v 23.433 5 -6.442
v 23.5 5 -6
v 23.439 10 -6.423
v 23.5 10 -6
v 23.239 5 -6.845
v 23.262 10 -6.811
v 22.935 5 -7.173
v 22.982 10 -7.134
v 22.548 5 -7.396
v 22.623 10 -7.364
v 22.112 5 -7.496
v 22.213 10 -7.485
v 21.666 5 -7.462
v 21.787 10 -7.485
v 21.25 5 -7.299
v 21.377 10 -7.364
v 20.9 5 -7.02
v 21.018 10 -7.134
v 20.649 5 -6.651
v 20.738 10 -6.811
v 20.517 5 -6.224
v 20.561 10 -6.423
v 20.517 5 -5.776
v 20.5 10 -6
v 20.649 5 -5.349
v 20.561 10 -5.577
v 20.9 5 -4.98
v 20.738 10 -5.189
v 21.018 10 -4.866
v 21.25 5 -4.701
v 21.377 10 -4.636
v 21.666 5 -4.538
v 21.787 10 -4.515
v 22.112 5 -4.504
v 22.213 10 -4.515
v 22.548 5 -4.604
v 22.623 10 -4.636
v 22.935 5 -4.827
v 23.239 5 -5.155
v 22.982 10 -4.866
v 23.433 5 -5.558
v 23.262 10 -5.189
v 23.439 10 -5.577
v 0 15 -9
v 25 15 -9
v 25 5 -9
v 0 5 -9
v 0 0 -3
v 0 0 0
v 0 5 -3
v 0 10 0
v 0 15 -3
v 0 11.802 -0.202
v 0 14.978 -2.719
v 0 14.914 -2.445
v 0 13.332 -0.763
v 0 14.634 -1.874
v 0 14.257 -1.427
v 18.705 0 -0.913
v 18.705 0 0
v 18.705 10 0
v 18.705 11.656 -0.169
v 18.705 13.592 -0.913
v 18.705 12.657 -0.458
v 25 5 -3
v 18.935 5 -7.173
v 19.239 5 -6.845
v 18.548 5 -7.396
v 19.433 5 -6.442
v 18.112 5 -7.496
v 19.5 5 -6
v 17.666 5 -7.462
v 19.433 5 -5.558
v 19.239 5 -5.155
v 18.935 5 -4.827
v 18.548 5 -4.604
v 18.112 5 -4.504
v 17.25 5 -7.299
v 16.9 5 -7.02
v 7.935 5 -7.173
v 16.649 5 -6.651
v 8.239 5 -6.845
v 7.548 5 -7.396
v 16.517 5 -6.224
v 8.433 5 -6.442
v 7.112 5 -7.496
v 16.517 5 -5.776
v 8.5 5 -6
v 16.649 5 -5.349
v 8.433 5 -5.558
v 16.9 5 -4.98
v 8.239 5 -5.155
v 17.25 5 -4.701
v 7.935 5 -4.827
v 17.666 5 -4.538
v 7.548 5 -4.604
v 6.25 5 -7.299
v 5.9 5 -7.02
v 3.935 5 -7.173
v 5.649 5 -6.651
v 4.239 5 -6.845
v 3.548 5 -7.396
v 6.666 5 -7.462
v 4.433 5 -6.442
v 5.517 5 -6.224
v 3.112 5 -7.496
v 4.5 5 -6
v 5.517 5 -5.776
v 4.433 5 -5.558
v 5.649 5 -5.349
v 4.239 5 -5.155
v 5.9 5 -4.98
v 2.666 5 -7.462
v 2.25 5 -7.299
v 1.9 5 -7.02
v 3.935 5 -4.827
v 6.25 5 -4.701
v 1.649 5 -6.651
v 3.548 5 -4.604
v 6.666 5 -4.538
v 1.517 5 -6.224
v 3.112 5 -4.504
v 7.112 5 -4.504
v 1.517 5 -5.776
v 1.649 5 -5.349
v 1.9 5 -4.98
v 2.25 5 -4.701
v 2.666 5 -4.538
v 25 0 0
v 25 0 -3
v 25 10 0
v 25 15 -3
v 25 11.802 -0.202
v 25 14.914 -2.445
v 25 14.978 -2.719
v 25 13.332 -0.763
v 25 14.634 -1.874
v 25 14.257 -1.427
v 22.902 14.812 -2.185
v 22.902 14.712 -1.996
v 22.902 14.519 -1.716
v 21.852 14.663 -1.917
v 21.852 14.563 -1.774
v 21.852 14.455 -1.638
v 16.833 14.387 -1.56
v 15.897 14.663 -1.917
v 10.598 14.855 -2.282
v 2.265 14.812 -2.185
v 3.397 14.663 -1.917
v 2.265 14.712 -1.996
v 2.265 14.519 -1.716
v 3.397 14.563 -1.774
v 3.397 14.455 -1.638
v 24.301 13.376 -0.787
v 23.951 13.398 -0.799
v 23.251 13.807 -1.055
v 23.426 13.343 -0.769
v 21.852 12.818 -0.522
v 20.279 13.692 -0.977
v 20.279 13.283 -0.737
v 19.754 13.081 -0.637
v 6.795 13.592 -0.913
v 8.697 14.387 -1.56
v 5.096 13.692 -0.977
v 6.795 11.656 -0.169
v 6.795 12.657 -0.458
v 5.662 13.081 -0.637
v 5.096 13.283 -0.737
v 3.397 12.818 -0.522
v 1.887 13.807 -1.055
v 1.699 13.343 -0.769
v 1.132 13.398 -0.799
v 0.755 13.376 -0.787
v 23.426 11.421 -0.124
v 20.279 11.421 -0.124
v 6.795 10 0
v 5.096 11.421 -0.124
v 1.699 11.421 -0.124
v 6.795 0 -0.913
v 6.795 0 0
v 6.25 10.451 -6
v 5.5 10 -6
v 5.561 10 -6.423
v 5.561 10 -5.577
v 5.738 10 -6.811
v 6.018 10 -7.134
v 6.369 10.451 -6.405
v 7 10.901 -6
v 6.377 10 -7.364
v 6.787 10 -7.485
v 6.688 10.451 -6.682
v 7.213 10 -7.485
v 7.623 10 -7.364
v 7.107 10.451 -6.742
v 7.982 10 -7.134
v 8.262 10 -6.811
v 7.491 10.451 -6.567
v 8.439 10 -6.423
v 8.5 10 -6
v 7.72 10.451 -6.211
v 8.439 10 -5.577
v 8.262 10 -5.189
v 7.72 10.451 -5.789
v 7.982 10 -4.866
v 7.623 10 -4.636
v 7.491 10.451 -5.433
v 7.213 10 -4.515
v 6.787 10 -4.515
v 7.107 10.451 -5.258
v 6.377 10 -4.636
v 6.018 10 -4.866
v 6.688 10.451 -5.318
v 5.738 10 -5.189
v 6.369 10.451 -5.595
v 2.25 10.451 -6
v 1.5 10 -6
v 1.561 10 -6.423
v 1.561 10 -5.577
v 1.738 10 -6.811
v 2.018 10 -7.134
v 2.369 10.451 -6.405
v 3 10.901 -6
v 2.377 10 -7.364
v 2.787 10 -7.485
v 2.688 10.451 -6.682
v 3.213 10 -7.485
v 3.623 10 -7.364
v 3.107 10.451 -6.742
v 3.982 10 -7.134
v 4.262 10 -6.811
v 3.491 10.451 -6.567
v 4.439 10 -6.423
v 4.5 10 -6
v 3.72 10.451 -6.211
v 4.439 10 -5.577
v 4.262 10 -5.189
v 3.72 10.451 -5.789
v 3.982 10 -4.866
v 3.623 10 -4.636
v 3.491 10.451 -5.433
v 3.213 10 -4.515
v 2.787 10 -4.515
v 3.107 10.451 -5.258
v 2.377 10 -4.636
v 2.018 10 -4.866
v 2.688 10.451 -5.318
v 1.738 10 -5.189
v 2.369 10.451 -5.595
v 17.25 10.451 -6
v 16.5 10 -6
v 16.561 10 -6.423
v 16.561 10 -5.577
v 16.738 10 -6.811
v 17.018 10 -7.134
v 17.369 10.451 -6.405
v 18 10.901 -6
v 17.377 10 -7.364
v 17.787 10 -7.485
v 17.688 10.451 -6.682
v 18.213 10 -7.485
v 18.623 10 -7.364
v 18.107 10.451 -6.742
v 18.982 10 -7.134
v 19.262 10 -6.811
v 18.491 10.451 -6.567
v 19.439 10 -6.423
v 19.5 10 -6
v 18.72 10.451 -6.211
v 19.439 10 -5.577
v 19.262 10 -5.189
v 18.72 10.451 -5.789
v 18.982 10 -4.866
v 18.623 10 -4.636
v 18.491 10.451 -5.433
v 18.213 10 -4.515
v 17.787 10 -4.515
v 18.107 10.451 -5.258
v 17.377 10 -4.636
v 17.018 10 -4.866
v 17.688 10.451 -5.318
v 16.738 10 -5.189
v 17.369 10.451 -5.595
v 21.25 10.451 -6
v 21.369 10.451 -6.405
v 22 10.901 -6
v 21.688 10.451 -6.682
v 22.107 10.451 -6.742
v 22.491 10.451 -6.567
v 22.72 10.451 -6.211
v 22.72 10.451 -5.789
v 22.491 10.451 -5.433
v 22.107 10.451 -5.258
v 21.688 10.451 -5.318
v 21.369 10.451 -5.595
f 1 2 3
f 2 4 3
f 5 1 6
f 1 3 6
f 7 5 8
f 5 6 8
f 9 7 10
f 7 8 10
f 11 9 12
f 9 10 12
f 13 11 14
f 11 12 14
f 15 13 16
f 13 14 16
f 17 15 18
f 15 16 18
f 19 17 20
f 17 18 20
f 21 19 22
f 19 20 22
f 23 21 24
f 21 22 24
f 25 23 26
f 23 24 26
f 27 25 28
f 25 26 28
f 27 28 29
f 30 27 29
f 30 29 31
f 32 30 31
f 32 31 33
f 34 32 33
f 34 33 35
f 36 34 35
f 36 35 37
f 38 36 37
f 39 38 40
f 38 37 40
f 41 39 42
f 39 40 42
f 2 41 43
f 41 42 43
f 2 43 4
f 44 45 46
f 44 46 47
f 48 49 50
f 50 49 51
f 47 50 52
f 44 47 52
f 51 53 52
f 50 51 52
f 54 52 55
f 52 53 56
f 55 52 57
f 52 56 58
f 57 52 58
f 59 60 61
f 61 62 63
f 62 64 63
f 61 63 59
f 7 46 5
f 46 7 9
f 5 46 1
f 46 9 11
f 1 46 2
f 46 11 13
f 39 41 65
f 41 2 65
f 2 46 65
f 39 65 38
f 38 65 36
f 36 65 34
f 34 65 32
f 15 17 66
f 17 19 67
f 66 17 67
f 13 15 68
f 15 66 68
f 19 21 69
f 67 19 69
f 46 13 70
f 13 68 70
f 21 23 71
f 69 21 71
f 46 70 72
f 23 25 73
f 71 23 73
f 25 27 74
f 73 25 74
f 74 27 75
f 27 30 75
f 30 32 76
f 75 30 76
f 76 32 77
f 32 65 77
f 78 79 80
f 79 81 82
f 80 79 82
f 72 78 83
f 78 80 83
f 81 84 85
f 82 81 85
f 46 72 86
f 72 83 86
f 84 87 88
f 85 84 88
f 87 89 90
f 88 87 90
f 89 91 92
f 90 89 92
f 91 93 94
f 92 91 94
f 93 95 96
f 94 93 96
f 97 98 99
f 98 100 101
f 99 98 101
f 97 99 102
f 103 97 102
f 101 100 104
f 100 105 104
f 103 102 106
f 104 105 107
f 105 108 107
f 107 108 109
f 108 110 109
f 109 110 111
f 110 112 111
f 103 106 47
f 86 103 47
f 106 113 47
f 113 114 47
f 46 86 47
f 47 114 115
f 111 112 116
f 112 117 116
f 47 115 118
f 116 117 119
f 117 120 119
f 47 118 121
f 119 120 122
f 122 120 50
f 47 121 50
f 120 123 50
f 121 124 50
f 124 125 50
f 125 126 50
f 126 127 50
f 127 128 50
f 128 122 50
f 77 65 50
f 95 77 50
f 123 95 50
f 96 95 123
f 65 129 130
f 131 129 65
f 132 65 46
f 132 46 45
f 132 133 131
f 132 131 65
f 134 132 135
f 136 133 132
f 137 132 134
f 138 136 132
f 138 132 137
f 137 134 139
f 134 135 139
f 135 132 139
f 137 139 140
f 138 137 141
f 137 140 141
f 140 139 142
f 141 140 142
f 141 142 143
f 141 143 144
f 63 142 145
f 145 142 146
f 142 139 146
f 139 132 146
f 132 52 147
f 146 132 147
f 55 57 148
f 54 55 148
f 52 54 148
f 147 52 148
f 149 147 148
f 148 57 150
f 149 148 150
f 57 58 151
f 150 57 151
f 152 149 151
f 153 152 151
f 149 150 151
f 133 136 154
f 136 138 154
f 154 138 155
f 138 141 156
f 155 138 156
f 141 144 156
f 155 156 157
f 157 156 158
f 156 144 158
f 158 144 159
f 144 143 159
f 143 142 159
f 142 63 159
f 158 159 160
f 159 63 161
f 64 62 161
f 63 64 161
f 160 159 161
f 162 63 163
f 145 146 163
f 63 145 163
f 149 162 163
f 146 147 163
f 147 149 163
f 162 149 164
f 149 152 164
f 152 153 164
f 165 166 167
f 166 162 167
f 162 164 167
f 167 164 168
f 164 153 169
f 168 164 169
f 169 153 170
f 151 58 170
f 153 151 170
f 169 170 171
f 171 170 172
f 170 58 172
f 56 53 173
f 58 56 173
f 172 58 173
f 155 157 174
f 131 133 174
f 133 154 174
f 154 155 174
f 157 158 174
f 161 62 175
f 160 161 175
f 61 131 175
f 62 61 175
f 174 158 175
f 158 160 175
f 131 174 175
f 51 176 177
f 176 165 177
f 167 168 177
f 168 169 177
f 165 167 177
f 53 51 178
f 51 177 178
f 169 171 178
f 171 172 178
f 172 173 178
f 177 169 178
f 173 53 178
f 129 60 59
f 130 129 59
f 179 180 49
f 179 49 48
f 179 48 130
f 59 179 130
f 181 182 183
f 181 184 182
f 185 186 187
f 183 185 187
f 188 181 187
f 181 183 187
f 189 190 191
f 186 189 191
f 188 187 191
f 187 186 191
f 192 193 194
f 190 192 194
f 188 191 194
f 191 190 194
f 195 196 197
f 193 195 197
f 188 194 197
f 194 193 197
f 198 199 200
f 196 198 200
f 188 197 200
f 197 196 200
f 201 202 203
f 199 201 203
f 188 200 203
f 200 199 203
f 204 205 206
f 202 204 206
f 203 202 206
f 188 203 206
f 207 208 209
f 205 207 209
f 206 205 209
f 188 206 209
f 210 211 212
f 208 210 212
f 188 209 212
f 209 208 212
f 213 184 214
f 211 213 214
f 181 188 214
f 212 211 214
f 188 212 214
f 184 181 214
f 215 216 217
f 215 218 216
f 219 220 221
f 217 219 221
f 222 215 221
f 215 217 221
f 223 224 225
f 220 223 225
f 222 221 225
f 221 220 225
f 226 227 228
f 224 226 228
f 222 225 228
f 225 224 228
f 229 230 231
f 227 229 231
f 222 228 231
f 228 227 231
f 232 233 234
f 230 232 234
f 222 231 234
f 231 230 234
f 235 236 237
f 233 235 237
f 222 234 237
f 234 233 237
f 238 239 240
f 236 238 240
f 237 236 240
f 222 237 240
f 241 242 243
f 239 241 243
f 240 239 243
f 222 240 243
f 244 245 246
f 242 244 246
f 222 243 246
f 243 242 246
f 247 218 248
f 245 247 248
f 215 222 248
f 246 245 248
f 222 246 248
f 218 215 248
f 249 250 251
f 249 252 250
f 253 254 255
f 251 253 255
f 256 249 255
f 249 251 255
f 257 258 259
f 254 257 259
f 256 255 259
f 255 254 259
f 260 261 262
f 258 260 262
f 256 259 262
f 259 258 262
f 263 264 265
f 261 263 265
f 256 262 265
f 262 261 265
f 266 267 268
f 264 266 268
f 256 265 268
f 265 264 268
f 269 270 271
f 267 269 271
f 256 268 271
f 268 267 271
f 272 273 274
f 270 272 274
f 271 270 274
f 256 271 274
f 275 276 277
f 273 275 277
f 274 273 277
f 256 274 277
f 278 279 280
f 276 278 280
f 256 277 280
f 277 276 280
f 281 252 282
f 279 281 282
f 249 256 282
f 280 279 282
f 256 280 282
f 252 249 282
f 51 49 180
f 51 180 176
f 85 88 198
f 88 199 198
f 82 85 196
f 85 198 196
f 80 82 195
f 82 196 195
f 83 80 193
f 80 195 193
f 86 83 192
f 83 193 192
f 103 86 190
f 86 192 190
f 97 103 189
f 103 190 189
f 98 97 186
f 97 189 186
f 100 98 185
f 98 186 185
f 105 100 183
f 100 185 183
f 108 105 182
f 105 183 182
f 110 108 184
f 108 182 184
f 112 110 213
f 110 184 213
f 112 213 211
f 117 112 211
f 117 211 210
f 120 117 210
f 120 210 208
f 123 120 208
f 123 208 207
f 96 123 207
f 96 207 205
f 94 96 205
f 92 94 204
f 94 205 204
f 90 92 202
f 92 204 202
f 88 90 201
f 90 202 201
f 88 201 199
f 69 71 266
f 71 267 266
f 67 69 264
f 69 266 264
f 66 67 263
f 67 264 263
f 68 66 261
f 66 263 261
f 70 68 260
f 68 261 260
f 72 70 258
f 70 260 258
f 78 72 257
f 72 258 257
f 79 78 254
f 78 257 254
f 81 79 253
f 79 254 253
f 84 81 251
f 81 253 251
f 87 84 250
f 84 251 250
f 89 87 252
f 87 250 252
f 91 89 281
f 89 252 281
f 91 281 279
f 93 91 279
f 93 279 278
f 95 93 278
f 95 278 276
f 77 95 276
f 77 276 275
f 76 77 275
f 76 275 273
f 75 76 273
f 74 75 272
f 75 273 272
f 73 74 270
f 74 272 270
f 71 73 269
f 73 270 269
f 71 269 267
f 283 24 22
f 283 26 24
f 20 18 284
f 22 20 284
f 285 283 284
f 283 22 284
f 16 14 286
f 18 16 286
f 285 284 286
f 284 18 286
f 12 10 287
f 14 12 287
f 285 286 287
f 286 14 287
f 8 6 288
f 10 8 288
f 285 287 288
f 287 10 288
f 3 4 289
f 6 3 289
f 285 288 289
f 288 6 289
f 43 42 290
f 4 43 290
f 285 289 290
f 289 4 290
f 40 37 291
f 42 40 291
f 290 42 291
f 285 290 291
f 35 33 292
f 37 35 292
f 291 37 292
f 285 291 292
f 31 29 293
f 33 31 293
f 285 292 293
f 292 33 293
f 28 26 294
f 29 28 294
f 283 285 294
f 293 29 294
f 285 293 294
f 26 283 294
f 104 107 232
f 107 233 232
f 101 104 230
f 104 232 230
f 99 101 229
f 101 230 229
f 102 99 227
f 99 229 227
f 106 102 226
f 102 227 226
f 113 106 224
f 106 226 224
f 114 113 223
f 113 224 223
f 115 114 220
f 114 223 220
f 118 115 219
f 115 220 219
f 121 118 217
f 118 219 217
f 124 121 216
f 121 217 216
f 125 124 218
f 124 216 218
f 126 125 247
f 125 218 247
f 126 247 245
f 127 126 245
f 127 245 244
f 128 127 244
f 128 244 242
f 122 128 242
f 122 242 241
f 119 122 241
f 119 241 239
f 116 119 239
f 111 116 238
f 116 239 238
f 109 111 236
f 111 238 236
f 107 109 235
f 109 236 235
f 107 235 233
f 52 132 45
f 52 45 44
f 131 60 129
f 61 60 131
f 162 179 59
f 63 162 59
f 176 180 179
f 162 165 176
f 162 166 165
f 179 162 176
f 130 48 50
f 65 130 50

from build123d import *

# Parameters (mm, degrees)
SKETCH1_W                 = 3
SKETCH1_H                 = 15
BOSS_EXTRUDE1_DEPTH       = 25
SKETCH2_W                 = 25
SKETCH2_H                 = 10
BOSS_EXTRUDE2_DEPTH       = 6
FILLET1_SIZE              = 3
FILLET1_SIZE_2            = 5
F_3_0MM_DOWEL_HOLE1_D     = 3
F_3_0MM_DOWEL_HOLE1_DEPTH = 5
F_3_0MM_DOWEL_HOLE1_TIP   = 0.901290929
SKETCH5_W                 = 11.909967374
SKETCH5_H                 = 2.030245184
CUT_EXTRUDE1_DEPTH        = 18


with BuildPart() as part:
    # Sketch1 → Boss-Extrude1 (new body)
    with BuildSketch(Plane(origin=(0, 0, 0), x_dir=(0, 0, -1), z_dir=(1, 0, 0))):
        with Locations((1.5, 7.5)):
            Rectangle(SKETCH1_W, SKETCH1_H)
    extrude(amount=BOSS_EXTRUDE1_DEPTH)

    # Sketch2 → Boss-Extrude2 (add)
    with BuildSketch(Plane(origin=(0, 0, -3), x_dir=(-1, 0, 0), z_dir=(0, 0, -1))):
        with Locations((-12.5, 10)):
            Rectangle(SKETCH2_W, SKETCH2_H)
    extrude(amount=BOSS_EXTRUDE2_DEPTH)

    # Fillet1
    # an asymmetric fillet: 5, 3 mm, written as the material it takes off along each edge
    with BuildSketch(Plane(origin=(-12.5, 15, 0), x_dir=(0, 0, -1), z_dir=(1, 0, 0))) as fillet1_piece_1:
        with BuildLine():
            Bezier((FILLET1_SIZE, 0), (0, 0), (0, -FILLET1_SIZE_2), weights=[1, 0.707106781, 1])
            Line((0, -FILLET1_SIZE_2), (0, 0))
            Line((0, 0), (FILLET1_SIZE, 0))
        make_face()
    extrude(amount=50, mode=Mode.SUBTRACT)

    # Ø3.0mm Dowel Hole1
    with Locations(Plane(origin=(0, 5, 0), x_dir=(-1, 0, 0), z_dir=(0, -1, 0))):
        with Locations((-3, 6), (-18, 6), (-7, 6), (-22, 6)):
            Hole(F_3_0MM_DOWEL_HOLE1_D / 2, depth=F_3_0MM_DOWEL_HOLE1_DEPTH)
            with Locations((0, 0, -(F_3_0MM_DOWEL_HOLE1_DEPTH + F_3_0MM_DOWEL_HOLE1_TIP / 2))):  # 118° drill point
                Cone(0, F_3_0MM_DOWEL_HOLE1_D / 2, F_3_0MM_DOWEL_HOLE1_TIP, mode=Mode.SUBTRACT)

    # Sketch5 → Cut-Extrude1 (cut)
    with BuildSketch(Plane(origin=(0, 15, 0), x_dir=(1, 0, 0), z_dir=(0, 1, 0))):
        with Locations((12.749835557, -0.102167309)):
            Rectangle(SKETCH5_W, SKETCH5_H)
    extrude(amount=-CUT_EXTRUDE1_DEPTH, mode=Mode.SUBTRACT)


solid = part.part
